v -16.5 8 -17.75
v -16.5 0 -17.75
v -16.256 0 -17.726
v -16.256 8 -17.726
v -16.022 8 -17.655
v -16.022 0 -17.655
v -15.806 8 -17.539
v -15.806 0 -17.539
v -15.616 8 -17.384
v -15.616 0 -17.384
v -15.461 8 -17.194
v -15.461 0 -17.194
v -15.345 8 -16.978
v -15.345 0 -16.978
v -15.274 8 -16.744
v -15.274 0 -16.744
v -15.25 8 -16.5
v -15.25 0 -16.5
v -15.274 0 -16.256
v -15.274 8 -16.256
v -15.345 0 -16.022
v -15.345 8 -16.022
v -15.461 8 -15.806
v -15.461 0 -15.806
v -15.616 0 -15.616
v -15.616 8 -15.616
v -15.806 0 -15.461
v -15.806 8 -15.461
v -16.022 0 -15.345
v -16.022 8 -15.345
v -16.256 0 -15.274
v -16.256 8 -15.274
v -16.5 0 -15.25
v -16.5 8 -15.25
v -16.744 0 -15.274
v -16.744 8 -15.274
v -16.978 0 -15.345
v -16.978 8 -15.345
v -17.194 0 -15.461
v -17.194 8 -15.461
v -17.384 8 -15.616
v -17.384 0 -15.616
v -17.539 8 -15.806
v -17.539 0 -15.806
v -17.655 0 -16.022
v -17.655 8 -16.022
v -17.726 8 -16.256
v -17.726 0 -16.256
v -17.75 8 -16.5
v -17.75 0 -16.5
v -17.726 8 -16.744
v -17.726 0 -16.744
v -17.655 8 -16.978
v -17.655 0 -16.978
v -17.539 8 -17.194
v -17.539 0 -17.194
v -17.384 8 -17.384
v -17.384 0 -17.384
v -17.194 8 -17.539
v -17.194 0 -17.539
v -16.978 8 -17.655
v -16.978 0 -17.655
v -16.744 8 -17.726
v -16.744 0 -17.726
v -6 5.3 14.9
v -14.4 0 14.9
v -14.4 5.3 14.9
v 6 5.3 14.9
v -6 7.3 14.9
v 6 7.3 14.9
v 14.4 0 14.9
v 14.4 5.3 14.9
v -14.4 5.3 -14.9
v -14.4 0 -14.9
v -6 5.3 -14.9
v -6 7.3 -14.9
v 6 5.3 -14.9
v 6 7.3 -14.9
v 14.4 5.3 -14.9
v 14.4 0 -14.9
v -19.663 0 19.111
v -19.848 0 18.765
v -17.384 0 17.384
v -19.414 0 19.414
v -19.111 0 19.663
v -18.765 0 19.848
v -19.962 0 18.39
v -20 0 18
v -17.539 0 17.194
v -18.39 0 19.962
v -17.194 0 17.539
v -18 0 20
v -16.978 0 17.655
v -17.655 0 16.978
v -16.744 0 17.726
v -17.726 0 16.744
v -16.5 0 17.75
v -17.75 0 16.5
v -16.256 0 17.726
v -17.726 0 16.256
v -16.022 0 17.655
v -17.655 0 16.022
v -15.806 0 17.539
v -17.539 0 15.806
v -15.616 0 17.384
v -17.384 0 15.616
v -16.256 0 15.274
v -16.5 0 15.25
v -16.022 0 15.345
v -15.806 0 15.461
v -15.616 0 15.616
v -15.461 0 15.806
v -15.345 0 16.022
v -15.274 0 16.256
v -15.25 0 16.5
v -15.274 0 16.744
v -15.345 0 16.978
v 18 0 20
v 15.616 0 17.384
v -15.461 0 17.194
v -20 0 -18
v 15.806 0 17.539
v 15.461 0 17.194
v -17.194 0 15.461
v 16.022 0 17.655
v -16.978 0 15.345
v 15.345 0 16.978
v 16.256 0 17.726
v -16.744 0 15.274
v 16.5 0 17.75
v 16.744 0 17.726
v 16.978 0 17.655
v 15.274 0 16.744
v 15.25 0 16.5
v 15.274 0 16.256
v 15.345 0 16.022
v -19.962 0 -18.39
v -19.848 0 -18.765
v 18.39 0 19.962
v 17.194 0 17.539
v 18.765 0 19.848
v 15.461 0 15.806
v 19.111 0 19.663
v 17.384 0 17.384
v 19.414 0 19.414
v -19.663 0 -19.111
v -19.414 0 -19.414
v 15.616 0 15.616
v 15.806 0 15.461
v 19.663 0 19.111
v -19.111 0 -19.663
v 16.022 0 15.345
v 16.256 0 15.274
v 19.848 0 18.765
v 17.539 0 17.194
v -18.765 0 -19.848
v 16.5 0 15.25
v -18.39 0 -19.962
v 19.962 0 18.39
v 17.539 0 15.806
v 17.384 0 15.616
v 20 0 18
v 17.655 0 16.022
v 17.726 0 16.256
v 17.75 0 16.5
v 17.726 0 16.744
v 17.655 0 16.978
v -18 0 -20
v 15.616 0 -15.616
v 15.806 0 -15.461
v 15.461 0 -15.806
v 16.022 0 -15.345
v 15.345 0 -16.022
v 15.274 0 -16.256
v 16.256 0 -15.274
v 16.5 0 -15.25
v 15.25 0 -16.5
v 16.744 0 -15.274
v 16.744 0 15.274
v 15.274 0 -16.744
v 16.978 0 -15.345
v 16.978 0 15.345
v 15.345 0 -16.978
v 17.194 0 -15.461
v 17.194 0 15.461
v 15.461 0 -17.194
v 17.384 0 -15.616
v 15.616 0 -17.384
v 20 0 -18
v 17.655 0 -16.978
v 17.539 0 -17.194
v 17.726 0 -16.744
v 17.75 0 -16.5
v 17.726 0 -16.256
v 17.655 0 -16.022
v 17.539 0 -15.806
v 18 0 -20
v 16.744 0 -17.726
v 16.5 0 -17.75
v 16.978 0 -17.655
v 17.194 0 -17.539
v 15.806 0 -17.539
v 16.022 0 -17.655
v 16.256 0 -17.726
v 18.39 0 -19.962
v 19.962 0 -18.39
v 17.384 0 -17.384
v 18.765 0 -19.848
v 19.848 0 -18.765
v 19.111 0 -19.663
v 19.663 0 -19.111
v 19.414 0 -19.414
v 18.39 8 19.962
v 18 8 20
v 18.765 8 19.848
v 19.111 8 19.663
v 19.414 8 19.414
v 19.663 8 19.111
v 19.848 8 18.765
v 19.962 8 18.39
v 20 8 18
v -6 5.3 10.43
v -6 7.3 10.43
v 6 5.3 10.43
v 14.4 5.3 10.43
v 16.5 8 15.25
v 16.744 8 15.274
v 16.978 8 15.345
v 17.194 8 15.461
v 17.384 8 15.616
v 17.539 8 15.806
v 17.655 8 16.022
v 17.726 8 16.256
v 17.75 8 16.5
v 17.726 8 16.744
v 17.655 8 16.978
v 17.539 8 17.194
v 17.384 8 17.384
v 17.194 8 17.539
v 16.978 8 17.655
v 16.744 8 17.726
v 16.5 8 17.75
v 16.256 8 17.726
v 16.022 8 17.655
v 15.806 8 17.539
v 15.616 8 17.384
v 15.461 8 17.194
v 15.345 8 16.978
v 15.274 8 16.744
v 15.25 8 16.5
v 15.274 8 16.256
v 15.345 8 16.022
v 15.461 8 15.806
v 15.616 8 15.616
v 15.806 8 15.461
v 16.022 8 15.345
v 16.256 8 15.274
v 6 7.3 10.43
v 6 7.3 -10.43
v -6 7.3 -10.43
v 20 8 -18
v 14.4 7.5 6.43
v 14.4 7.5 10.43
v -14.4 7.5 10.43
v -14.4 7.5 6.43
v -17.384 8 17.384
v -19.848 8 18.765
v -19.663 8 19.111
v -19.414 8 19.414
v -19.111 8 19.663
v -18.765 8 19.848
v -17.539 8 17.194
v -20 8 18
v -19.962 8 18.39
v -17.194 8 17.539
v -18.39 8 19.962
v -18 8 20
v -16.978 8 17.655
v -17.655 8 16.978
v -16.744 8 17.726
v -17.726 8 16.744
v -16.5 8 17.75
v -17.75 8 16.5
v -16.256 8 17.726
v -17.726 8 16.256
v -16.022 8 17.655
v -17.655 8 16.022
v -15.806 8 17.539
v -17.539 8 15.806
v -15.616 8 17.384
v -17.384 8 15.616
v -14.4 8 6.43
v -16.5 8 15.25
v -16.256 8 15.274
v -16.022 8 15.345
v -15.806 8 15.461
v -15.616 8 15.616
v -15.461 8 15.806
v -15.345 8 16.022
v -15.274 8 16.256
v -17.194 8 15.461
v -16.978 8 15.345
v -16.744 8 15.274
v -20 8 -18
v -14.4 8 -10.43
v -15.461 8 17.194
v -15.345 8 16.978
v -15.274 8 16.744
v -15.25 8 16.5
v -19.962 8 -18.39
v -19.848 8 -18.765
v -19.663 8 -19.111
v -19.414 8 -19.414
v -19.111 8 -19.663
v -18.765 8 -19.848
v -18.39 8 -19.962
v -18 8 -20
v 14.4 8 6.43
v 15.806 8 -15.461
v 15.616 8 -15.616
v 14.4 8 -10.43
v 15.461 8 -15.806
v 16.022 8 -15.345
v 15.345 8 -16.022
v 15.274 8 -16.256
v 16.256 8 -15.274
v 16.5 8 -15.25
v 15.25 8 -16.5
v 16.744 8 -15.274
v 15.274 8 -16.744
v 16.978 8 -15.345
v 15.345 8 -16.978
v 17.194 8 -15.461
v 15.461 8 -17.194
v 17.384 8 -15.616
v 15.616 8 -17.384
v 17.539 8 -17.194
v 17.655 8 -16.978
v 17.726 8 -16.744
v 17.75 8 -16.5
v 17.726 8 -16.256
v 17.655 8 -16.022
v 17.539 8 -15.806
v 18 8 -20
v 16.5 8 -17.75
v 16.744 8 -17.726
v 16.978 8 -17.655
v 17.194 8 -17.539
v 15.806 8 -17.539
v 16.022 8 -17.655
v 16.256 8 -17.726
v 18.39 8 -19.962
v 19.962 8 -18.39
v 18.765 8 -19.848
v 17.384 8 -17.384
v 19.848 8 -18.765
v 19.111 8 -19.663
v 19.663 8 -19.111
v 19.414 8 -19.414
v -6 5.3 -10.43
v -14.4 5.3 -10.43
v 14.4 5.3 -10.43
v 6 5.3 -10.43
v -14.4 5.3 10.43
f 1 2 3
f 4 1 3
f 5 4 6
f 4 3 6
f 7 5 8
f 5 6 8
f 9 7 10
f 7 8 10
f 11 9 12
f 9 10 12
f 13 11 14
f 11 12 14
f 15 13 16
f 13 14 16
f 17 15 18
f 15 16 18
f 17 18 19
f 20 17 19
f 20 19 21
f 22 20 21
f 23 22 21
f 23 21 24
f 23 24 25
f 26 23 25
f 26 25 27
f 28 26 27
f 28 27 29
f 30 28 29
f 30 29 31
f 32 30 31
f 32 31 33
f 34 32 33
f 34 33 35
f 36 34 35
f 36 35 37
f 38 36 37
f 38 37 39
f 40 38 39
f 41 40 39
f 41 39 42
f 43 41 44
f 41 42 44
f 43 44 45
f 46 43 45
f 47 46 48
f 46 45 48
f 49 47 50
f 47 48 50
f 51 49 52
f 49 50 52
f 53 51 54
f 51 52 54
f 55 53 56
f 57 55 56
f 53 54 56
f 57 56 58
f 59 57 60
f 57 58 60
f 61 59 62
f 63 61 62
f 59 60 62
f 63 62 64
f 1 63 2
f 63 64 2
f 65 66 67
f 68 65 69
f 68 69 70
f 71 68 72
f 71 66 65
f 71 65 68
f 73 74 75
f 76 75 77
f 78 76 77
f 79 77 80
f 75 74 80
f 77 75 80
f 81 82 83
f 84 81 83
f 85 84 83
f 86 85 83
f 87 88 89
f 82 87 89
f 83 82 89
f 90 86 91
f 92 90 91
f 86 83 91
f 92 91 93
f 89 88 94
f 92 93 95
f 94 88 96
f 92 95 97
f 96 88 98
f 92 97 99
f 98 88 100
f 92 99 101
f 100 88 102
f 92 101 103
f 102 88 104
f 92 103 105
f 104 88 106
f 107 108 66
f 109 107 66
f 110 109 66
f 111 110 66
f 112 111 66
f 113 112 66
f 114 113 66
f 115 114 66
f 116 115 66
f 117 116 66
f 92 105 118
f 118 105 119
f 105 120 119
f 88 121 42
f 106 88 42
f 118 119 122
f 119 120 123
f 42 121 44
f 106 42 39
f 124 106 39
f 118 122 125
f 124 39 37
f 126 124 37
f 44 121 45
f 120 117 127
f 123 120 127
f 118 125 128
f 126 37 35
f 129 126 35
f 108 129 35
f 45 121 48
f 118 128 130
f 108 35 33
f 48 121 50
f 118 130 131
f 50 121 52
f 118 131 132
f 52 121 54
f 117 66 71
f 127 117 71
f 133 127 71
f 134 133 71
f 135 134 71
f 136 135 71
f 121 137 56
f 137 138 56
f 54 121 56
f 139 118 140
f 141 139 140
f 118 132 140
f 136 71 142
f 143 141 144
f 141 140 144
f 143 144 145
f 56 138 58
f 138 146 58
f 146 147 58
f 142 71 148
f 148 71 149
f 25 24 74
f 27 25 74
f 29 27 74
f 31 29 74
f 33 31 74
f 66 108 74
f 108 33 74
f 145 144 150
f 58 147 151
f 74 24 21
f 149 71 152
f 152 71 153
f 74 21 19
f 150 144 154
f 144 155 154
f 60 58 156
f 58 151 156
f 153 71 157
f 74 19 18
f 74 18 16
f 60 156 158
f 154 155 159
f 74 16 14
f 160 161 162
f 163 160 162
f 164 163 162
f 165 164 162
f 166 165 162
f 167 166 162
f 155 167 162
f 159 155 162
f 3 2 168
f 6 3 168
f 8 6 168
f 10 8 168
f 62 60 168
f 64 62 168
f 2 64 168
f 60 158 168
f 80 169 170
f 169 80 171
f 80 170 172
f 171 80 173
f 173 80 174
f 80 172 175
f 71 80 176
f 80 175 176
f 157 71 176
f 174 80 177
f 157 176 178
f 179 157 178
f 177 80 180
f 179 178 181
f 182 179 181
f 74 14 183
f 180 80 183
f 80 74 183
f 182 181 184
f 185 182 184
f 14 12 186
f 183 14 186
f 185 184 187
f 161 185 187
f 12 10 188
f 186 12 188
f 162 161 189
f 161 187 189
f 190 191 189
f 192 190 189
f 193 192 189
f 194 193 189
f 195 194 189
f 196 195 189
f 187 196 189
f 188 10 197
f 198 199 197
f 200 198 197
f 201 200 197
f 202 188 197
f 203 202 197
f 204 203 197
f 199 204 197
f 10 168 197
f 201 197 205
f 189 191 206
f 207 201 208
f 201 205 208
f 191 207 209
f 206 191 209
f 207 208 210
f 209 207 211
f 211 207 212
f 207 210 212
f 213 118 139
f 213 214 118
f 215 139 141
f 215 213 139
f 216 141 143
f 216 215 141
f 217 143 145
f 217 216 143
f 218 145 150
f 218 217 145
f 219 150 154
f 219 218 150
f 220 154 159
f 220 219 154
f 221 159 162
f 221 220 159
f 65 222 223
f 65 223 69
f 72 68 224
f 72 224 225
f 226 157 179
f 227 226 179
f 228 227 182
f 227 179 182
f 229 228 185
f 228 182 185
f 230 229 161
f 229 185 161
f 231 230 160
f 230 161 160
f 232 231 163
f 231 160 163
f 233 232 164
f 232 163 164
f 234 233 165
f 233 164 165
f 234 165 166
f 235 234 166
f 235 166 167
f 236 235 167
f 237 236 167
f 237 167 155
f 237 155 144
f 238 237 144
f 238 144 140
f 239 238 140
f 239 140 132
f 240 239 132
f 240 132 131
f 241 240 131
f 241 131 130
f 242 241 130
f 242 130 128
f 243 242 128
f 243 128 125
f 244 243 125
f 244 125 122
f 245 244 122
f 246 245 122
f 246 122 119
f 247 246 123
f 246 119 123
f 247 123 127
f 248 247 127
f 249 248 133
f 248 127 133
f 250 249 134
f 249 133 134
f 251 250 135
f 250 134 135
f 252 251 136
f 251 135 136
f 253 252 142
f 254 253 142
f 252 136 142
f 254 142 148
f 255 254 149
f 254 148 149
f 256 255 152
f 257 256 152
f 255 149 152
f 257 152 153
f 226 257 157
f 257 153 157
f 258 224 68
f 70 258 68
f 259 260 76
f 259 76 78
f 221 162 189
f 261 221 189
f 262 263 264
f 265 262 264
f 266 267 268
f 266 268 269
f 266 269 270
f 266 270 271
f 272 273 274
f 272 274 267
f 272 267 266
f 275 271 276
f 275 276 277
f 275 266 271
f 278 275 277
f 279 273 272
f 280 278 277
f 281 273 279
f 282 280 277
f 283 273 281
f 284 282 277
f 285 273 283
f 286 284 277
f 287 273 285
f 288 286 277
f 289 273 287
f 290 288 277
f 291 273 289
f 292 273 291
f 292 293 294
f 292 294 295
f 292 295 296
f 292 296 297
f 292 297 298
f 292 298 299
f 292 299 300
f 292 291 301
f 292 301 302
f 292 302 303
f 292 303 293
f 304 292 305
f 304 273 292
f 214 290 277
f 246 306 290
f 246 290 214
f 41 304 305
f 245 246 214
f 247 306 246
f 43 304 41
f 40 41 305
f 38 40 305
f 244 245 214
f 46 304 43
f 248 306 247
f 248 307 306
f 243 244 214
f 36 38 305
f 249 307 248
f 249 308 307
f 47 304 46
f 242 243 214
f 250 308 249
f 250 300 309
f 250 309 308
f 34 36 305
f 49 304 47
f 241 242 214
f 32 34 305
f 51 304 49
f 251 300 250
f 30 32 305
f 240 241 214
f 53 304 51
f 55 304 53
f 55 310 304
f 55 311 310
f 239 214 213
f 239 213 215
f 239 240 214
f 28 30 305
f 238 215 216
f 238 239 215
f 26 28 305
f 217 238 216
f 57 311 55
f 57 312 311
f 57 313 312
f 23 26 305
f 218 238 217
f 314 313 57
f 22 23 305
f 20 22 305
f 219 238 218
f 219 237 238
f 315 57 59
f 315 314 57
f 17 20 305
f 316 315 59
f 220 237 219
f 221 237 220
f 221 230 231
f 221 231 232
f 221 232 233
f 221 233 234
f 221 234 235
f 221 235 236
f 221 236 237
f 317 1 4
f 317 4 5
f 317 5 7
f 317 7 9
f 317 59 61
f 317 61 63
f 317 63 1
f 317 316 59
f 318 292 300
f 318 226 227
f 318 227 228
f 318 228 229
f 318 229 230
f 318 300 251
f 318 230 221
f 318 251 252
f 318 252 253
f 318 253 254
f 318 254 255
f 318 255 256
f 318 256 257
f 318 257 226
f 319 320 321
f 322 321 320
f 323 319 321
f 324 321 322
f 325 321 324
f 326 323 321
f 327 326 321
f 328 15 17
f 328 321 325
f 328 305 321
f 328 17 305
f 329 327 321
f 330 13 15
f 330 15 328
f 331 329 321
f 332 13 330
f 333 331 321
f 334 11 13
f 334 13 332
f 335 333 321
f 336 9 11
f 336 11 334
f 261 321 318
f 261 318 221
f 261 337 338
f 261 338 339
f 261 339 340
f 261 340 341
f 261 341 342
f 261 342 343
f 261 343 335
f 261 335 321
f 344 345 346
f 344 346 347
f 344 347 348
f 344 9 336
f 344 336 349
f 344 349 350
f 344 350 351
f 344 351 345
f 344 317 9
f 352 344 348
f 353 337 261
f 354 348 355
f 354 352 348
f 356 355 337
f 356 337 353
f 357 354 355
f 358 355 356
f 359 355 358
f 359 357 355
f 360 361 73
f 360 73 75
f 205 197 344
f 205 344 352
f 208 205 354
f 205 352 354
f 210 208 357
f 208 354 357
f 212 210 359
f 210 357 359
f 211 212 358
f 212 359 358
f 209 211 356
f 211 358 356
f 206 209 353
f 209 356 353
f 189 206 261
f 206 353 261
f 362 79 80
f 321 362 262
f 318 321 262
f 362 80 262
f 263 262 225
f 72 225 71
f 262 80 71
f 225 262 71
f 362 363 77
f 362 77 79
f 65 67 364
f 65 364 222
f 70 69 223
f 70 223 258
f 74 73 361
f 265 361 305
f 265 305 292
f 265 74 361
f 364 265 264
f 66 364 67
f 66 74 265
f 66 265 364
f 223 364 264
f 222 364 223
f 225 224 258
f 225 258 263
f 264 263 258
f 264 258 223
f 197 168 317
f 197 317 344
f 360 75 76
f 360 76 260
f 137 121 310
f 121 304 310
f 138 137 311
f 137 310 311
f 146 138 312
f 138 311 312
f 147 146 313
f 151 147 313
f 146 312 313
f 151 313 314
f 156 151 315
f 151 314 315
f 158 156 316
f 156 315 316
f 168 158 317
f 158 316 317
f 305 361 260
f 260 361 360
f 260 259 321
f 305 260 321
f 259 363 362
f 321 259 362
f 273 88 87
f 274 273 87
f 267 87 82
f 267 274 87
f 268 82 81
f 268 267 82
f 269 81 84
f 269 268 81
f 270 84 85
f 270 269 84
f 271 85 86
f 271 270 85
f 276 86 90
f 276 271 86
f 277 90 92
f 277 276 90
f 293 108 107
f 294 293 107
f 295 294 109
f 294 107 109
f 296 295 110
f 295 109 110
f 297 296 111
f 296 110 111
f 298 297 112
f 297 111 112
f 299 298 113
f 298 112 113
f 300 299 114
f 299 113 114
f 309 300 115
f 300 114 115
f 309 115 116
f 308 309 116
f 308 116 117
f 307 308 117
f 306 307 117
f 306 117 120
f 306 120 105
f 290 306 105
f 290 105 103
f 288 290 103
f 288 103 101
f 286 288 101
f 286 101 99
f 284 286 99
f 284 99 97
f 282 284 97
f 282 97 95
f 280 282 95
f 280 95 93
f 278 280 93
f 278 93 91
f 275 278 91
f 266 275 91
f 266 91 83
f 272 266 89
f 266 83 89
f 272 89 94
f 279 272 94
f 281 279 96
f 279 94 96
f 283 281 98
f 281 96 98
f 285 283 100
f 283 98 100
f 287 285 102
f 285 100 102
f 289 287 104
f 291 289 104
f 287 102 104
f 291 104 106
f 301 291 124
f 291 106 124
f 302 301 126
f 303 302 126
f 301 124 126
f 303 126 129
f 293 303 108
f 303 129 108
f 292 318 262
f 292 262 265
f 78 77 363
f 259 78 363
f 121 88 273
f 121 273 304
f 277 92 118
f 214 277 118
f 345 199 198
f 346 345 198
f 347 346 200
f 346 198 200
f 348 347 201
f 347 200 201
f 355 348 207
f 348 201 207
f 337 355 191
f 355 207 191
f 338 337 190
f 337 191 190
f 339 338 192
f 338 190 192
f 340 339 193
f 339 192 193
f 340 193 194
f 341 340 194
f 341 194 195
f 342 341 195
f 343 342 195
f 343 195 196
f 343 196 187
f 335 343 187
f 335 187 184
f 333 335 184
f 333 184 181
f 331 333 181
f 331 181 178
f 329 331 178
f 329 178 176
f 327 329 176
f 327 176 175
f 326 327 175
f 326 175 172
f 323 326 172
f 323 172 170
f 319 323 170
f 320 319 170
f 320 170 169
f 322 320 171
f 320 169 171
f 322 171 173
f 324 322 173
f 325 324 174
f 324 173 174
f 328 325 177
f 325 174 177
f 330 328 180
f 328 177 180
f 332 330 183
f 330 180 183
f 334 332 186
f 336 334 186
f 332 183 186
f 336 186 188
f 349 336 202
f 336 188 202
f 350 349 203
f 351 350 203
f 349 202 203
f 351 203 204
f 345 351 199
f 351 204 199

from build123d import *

# Parameters (mm, degrees)
SKETCH_1_W             = 40
SKETCH_1_H             = 40
EXTRUDE_637_DEPTH      = 8
SKETCH_2_W             = 28.8
SKETCH_2_H             = 29.8
CUT_EXTRUDE_819_DEPTH  = 5.3
SKETCH_3_W             = 28.8
SKETCH_3_H             = 20.86
CUT_EXTRUDE_1010_DEPTH = 29.776552955
SKETCH_4_W             = 12
SKETCH_4_H             = 4.47
CUT_EXTRUDE_1227_DEPTH = 2
SKETCH_5_W             = 28.8
SKETCH_5_H             = 0.5
EXTRUDE_1458_DEPTH     = 4
SKETCH_7_R             = 1.25
CUT_EXTRUDE_1697_DEPTH = 30.393876913
FILLET_1_R             = 2


with BuildPart() as part:
    # Эскиз1 → Extrude 637 (new body)
    with BuildSketch(Plane(origin=(0, 0, 0), x_dir=(1, 0, 0), z_dir=(0, 1, 0))):
        Rectangle(SKETCH_1_W, SKETCH_1_H)
    extrude(amount=EXTRUDE_637_DEPTH)

    # Эскиз2 → Cut-Extrude 819 (cut)
    with BuildSketch(Plane.XZ):
        Rectangle(SKETCH_2_W, SKETCH_2_H)
    extrude(amount=-CUT_EXTRUDE_819_DEPTH, mode=Mode.SUBTRACT)

    # Эскиз3 → Cut-Extrude 1010 (cut, through all)
    with BuildSketch(Plane.XZ.offset(-5.3)):
        Rectangle(SKETCH_3_W, SKETCH_3_H)
    extrude(amount=-CUT_EXTRUDE_1010_DEPTH, mode=Mode.SUBTRACT)

    # Эскиз4 → Cut-Extrude 1227 (cut)
    with BuildSketch(Plane.XZ.offset(-5.3)):
        with Locations((0, 12.665)):
            Rectangle(SKETCH_4_W, SKETCH_4_H)
        with Locations((0, -12.665)):
            Rectangle(SKETCH_4_W, SKETCH_4_H)
    extrude(amount=-CUT_EXTRUDE_1227_DEPTH, mode=Mode.SUBTRACT)

    # Эскиз5 → Extrude 1458 (add)
    with BuildSketch(Plane(origin=(0, 0, 10.43), x_dir=(-1, 0, 0), z_dir=(0, 0, -1))):
        with Locations((0, 7.75)):
            Rectangle(SKETCH_5_W, SKETCH_5_H)
    extrude(amount=EXTRUDE_1458_DEPTH)

    # Эскиз7 → Cut-Extrude 1697 (cut, through all)
    with BuildSketch(Plane.XZ):
        with Locations(Location((-16.5, 16.5, 0), (0, 0, 270))):
            Circle(SKETCH_7_R)
        with Locations(Location((16.5, 16.5, 0), (0, 0, 270))):
            Circle(SKETCH_7_R)
        with Locations(Location((16.5, -16.5, 0), (0, 0, 270))):
            Circle(SKETCH_7_R)
        with Locations(Location((-16.5, -16.5, 0), (0, 0, 270))):
            Circle(SKETCH_7_R)
    extrude(amount=-CUT_EXTRUDE_1697_DEPTH, mode=Mode.SUBTRACT)

    # Скругление1
    fillet_1_edges = [part.edges().sort_by_distance(p)[0] for p in [
        (20, 4, 20),
        (-20, 4, 20),
        (-20, 4, -20),
        (20, 4, -20),
    ]]
    fillet(fillet_1_edges, radius=FILLET_1_R)


solid = part.part
